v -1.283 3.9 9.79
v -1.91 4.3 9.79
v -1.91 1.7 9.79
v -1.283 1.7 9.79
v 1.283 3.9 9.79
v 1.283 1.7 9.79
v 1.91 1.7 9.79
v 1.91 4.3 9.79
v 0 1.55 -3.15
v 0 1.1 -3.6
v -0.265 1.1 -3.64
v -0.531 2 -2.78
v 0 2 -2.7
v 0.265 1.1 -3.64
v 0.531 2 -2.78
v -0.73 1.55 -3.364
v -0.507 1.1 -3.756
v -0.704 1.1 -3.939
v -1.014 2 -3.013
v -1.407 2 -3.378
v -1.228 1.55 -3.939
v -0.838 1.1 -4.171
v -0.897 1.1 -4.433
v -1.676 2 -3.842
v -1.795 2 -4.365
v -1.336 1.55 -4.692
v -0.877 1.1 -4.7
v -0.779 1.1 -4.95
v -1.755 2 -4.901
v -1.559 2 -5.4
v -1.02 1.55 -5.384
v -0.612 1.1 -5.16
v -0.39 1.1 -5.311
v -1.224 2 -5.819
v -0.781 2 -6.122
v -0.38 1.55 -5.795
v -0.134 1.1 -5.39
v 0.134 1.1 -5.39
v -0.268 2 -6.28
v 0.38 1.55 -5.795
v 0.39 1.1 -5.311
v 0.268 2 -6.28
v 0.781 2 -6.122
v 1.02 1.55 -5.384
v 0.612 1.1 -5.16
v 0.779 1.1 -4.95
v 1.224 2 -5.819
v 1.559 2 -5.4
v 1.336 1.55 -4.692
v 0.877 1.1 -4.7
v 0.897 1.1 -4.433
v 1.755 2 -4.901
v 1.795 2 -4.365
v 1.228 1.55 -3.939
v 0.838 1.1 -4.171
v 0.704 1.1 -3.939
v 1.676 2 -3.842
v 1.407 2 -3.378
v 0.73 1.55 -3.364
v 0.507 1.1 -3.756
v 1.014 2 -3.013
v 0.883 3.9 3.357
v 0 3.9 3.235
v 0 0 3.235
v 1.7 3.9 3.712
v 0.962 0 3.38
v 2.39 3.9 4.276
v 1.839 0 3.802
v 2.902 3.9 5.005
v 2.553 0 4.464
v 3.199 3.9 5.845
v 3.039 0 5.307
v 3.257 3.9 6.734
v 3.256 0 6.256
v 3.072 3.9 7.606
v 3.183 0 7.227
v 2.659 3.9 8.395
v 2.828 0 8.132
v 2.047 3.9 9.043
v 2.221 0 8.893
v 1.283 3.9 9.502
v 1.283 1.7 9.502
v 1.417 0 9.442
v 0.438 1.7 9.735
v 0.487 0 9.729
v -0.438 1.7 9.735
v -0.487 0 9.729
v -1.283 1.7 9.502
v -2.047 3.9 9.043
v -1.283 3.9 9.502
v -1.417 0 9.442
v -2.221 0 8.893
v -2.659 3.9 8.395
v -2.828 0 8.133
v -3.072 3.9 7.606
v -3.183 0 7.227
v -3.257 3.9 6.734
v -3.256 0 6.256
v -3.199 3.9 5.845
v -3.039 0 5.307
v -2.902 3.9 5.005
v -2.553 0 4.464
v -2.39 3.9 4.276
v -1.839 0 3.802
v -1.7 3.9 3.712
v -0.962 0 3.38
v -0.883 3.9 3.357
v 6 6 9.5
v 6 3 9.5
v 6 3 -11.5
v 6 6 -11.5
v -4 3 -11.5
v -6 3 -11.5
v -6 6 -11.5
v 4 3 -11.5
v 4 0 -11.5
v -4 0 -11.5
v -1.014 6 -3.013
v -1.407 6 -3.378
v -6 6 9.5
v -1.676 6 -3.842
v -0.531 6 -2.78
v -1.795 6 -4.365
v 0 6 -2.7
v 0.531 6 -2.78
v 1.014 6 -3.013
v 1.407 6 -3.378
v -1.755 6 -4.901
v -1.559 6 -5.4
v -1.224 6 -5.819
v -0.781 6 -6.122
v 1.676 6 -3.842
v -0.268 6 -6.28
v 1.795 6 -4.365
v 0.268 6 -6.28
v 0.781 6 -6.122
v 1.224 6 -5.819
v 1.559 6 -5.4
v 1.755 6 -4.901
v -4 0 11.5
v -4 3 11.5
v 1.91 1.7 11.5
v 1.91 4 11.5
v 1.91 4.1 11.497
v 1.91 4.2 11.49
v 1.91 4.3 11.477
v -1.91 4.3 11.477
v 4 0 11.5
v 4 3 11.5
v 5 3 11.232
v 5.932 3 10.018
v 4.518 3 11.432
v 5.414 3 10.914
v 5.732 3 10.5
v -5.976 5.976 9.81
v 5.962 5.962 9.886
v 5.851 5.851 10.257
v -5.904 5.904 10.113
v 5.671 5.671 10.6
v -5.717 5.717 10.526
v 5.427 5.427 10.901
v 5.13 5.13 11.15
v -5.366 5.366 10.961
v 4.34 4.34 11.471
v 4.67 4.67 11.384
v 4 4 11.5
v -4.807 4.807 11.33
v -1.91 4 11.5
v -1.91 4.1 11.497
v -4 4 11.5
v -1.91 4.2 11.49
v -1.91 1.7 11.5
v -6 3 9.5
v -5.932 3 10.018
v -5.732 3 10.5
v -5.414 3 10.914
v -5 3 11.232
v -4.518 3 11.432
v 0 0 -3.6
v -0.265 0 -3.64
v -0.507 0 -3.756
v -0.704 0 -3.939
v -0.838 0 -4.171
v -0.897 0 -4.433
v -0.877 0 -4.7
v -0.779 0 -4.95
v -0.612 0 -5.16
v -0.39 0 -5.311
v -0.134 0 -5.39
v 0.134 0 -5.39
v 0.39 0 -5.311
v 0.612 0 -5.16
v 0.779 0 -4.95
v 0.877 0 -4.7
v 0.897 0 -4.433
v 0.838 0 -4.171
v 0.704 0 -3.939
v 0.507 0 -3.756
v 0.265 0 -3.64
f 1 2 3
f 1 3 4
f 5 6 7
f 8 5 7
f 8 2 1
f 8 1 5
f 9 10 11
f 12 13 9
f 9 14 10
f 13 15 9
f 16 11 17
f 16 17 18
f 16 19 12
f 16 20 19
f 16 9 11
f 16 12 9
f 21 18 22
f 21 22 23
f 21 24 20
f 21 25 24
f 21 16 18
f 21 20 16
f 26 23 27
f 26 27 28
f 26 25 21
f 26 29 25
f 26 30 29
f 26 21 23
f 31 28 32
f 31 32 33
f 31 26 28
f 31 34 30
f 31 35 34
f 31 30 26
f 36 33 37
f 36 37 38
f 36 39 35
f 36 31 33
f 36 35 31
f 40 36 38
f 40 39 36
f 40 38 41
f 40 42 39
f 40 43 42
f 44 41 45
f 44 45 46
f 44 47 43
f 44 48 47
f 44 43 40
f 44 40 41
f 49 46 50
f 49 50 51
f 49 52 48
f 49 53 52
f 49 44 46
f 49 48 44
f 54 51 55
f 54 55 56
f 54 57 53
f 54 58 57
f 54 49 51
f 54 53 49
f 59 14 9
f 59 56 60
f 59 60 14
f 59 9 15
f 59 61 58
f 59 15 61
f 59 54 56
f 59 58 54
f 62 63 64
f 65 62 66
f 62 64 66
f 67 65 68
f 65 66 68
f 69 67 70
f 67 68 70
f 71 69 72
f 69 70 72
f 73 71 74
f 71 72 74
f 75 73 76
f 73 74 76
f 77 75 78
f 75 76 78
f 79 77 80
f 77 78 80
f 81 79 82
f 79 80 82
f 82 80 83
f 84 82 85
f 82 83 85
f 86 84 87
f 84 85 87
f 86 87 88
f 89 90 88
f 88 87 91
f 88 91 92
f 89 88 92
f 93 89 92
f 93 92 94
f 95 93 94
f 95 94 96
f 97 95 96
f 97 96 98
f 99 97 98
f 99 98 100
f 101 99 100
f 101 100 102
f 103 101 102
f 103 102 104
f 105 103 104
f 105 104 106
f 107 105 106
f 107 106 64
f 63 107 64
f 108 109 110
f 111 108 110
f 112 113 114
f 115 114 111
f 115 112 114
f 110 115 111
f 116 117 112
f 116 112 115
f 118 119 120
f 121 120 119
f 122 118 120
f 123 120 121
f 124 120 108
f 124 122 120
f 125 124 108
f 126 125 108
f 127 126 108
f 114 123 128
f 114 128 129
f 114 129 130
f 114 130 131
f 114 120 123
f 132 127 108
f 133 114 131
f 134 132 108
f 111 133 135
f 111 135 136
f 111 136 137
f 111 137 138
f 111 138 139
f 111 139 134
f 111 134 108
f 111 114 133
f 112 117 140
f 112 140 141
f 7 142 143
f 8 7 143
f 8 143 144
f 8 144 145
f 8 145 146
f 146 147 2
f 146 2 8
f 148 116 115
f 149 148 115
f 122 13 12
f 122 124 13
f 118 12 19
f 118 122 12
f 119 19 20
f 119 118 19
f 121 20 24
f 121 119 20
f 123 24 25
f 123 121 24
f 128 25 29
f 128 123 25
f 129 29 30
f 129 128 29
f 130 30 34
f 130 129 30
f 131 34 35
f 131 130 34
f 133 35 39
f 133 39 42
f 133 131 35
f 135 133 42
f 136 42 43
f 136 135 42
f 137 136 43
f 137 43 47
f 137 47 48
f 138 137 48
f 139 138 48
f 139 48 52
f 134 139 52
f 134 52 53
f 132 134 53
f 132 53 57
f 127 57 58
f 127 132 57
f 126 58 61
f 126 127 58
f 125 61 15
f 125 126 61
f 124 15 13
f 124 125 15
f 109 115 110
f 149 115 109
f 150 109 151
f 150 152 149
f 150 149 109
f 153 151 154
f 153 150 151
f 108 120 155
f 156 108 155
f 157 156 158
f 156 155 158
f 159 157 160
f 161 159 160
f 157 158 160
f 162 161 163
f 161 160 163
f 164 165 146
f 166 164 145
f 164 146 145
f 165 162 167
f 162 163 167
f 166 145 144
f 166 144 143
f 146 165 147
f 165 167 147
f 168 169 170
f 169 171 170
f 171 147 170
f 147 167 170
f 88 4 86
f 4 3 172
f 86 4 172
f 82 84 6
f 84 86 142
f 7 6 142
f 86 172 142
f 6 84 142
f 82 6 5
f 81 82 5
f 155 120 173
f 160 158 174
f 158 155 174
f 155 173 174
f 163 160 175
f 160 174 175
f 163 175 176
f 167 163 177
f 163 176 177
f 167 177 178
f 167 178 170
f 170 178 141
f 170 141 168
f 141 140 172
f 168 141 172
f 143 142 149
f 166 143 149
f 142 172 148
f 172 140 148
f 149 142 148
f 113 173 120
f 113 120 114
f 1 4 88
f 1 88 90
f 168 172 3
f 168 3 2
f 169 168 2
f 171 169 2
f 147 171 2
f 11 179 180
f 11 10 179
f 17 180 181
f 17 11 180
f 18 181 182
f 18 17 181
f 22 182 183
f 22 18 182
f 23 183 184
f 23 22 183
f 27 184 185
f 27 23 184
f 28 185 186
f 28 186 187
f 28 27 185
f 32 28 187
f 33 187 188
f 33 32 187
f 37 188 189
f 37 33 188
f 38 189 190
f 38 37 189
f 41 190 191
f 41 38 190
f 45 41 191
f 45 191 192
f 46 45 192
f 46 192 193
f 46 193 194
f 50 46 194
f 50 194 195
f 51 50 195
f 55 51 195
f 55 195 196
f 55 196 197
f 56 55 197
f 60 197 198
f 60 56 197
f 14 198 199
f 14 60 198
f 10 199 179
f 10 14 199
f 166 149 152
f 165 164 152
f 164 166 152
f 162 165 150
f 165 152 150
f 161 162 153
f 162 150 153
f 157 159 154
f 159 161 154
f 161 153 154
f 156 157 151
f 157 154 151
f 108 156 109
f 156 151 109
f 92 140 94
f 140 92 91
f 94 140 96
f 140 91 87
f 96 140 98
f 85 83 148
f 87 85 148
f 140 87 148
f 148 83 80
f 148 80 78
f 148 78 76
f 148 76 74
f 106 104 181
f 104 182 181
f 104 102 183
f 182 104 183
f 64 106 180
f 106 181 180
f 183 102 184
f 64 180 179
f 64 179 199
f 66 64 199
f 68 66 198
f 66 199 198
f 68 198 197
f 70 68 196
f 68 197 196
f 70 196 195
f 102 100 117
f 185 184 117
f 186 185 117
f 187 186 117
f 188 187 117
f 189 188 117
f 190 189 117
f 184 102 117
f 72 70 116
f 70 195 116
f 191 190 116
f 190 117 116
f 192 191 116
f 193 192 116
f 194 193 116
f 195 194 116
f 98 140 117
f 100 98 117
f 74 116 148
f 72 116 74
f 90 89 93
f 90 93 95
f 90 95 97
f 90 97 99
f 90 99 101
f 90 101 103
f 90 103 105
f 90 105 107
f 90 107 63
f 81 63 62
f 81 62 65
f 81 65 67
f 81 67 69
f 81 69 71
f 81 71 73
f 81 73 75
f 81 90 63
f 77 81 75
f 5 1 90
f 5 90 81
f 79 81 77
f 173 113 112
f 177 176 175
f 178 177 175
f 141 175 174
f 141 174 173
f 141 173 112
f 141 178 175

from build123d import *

# Parameters (mm, degrees)
SKETCH1_W           = 12
SKETCH1_H           = 23
BOSS_EXTRUDE1_DEPTH = 6
SKETCH2_W           = 2
SKETCH2_H           = 3
CUT_EXTRUDE1_DEPTH  = 25.515301344
SKETCH3_W           = 3.82
SKETCH3_H           = 2.6
CUT_EXTRUDE2_DEPTH  = 1.71
SKETCH4_W           = 2.566615902
SKETCH4_H           = 2.2
CUT_EXTRUDE3_DEPTH  = 3.1
CUT_EXTRUDE4_REACH  = 16.292
SKETCH5_R           = 3.265
FILLET1_R           = 2


with BuildPart() as part:
    # Sketch1 → Boss-Extrude1 (new body)
    with BuildSketch(Plane(origin=(0, 0, 0), x_dir=(1, 0, 0), z_dir=(0, 1, 0))):
        Rectangle(SKETCH1_W, SKETCH1_H)
    extrude(amount=BOSS_EXTRUDE1_DEPTH)

    # Sketch2 → Cut-Extrude1 (cut, through all)
    with BuildSketch(Plane.XY.offset(11.5)):
        with Locations((5, 1.5)):
            Rectangle(SKETCH2_W, SKETCH2_H)
        with Locations((-5, 1.5)):
            Rectangle(SKETCH2_W, SKETCH2_H)
    extrude(amount=-CUT_EXTRUDE1_DEPTH, mode=Mode.SUBTRACT)

    # Sketch3 → Cut-Extrude2 (cut)
    with BuildSketch(Plane.XY.offset(11.5)):
        with Locations((0, 3)):
            Rectangle(SKETCH3_W, SKETCH3_H)
    extrude(amount=-CUT_EXTRUDE2_DEPTH, mode=Mode.SUBTRACT)

    # Sketch4 → Cut-Extrude3 (cut)
    with BuildSketch(Plane.XY.offset(9.79)):
        with Locations((0, 2.8)):
            Rectangle(SKETCH4_W, SKETCH4_H)
    extrude(amount=-CUT_EXTRUDE3_DEPTH, mode=Mode.SUBTRACT)

    # Cut-Extrude4: up to this face of the body (flat: up to its plane)
    cut_extrude4_end = Plane(part.part.faces().sort_by_distance((0, 3.9, 8.24))[0])
    # Sketch5 → Cut-Extrude4 (cut, up to the picked face)
    with BuildSketch(Plane.XZ, mode=Mode.PRIVATE) as cut_extrude4_sk1:
        with Locations(Location((0, 6.5, 0), (0, 0, 270))):
            Circle(SKETCH5_R)
    cut_extrude4_tool1 = split(extrude(cut_extrude4_sk1.sketch, amount=-CUT_EXTRUDE4_REACH, mode=Mode.PRIVATE), bisect_by=cut_extrude4_end, keep=Keep.BOTH, mode=Mode.PRIVATE)
    add(cut_extrude4_tool1.solids().sort_by(Axis((0, 0, 6.5), (0, 1, 0)))[0], mode=Mode.SUBTRACT)

    # Fillet1
    # the kernel refuses this fillet: 2 mm, written as the material it takes off along each edge
    with BuildSketch(Plane(origin=(6, -2, 11.5), x_dir=(0, 0, -1), z_dir=(0, 1, 0))) as fillet1_piece_1:
        with BuildLine():
            CenterArc((FILLET1_R, FILLET1_R), FILLET1_R, 180, 90)
            Line((0, FILLET1_R), (0, 0))
            Line((0, 0), (FILLET1_R, 0))
        make_face()
    extrude(amount=13, mode=Mode.SUBTRACT)
    with BuildSketch(Plane(origin=(-11, 6, 11.5), x_dir=(0, 0, -1), z_dir=(1, 0, 0))) as fillet1_piece_2:
        with BuildLine():
            CenterArc((FILLET1_R, -FILLET1_R), FILLET1_R, 90, 90)
            Line((0, -FILLET1_R), (0, 0))
            Line((0, 0), (FILLET1_R, 0))
        make_face()
    extrude(amount=22, mode=Mode.SUBTRACT)
    with BuildSketch(Plane(origin=(-6, -2, 11.5), x_dir=(0, 0, -1), z_dir=(0, 1, 0))) as fillet1_piece_3:
        with BuildLine():
            CenterArc((FILLET1_R, -FILLET1_R), FILLET1_R, 90, 90)
            Line((0, -FILLET1_R), (0, 0))
            Line((0, 0), (FILLET1_R, 0))
        make_face()
    extrude(amount=13, mode=Mode.SUBTRACT)

    # Sketch7 → CSK SLOT for M1.6 Countersunk Flat Head Screw1 (revolve, cut)
    with BuildSketch(Plane(origin=(0, 6, -4.5), x_dir=(0, 0, 1), z_dir=(1, 0, 0))):
        Polygon((0, 0), (0, 6), (0.9, 6), (0.9, 4.9), (1.8, 4), (1.8, 0), align=None)
    revolve(axis=Axis((0, 12.35, -4.5), (0, -1, 0)), mode=Mode.SUBTRACT)


solid = part.part
